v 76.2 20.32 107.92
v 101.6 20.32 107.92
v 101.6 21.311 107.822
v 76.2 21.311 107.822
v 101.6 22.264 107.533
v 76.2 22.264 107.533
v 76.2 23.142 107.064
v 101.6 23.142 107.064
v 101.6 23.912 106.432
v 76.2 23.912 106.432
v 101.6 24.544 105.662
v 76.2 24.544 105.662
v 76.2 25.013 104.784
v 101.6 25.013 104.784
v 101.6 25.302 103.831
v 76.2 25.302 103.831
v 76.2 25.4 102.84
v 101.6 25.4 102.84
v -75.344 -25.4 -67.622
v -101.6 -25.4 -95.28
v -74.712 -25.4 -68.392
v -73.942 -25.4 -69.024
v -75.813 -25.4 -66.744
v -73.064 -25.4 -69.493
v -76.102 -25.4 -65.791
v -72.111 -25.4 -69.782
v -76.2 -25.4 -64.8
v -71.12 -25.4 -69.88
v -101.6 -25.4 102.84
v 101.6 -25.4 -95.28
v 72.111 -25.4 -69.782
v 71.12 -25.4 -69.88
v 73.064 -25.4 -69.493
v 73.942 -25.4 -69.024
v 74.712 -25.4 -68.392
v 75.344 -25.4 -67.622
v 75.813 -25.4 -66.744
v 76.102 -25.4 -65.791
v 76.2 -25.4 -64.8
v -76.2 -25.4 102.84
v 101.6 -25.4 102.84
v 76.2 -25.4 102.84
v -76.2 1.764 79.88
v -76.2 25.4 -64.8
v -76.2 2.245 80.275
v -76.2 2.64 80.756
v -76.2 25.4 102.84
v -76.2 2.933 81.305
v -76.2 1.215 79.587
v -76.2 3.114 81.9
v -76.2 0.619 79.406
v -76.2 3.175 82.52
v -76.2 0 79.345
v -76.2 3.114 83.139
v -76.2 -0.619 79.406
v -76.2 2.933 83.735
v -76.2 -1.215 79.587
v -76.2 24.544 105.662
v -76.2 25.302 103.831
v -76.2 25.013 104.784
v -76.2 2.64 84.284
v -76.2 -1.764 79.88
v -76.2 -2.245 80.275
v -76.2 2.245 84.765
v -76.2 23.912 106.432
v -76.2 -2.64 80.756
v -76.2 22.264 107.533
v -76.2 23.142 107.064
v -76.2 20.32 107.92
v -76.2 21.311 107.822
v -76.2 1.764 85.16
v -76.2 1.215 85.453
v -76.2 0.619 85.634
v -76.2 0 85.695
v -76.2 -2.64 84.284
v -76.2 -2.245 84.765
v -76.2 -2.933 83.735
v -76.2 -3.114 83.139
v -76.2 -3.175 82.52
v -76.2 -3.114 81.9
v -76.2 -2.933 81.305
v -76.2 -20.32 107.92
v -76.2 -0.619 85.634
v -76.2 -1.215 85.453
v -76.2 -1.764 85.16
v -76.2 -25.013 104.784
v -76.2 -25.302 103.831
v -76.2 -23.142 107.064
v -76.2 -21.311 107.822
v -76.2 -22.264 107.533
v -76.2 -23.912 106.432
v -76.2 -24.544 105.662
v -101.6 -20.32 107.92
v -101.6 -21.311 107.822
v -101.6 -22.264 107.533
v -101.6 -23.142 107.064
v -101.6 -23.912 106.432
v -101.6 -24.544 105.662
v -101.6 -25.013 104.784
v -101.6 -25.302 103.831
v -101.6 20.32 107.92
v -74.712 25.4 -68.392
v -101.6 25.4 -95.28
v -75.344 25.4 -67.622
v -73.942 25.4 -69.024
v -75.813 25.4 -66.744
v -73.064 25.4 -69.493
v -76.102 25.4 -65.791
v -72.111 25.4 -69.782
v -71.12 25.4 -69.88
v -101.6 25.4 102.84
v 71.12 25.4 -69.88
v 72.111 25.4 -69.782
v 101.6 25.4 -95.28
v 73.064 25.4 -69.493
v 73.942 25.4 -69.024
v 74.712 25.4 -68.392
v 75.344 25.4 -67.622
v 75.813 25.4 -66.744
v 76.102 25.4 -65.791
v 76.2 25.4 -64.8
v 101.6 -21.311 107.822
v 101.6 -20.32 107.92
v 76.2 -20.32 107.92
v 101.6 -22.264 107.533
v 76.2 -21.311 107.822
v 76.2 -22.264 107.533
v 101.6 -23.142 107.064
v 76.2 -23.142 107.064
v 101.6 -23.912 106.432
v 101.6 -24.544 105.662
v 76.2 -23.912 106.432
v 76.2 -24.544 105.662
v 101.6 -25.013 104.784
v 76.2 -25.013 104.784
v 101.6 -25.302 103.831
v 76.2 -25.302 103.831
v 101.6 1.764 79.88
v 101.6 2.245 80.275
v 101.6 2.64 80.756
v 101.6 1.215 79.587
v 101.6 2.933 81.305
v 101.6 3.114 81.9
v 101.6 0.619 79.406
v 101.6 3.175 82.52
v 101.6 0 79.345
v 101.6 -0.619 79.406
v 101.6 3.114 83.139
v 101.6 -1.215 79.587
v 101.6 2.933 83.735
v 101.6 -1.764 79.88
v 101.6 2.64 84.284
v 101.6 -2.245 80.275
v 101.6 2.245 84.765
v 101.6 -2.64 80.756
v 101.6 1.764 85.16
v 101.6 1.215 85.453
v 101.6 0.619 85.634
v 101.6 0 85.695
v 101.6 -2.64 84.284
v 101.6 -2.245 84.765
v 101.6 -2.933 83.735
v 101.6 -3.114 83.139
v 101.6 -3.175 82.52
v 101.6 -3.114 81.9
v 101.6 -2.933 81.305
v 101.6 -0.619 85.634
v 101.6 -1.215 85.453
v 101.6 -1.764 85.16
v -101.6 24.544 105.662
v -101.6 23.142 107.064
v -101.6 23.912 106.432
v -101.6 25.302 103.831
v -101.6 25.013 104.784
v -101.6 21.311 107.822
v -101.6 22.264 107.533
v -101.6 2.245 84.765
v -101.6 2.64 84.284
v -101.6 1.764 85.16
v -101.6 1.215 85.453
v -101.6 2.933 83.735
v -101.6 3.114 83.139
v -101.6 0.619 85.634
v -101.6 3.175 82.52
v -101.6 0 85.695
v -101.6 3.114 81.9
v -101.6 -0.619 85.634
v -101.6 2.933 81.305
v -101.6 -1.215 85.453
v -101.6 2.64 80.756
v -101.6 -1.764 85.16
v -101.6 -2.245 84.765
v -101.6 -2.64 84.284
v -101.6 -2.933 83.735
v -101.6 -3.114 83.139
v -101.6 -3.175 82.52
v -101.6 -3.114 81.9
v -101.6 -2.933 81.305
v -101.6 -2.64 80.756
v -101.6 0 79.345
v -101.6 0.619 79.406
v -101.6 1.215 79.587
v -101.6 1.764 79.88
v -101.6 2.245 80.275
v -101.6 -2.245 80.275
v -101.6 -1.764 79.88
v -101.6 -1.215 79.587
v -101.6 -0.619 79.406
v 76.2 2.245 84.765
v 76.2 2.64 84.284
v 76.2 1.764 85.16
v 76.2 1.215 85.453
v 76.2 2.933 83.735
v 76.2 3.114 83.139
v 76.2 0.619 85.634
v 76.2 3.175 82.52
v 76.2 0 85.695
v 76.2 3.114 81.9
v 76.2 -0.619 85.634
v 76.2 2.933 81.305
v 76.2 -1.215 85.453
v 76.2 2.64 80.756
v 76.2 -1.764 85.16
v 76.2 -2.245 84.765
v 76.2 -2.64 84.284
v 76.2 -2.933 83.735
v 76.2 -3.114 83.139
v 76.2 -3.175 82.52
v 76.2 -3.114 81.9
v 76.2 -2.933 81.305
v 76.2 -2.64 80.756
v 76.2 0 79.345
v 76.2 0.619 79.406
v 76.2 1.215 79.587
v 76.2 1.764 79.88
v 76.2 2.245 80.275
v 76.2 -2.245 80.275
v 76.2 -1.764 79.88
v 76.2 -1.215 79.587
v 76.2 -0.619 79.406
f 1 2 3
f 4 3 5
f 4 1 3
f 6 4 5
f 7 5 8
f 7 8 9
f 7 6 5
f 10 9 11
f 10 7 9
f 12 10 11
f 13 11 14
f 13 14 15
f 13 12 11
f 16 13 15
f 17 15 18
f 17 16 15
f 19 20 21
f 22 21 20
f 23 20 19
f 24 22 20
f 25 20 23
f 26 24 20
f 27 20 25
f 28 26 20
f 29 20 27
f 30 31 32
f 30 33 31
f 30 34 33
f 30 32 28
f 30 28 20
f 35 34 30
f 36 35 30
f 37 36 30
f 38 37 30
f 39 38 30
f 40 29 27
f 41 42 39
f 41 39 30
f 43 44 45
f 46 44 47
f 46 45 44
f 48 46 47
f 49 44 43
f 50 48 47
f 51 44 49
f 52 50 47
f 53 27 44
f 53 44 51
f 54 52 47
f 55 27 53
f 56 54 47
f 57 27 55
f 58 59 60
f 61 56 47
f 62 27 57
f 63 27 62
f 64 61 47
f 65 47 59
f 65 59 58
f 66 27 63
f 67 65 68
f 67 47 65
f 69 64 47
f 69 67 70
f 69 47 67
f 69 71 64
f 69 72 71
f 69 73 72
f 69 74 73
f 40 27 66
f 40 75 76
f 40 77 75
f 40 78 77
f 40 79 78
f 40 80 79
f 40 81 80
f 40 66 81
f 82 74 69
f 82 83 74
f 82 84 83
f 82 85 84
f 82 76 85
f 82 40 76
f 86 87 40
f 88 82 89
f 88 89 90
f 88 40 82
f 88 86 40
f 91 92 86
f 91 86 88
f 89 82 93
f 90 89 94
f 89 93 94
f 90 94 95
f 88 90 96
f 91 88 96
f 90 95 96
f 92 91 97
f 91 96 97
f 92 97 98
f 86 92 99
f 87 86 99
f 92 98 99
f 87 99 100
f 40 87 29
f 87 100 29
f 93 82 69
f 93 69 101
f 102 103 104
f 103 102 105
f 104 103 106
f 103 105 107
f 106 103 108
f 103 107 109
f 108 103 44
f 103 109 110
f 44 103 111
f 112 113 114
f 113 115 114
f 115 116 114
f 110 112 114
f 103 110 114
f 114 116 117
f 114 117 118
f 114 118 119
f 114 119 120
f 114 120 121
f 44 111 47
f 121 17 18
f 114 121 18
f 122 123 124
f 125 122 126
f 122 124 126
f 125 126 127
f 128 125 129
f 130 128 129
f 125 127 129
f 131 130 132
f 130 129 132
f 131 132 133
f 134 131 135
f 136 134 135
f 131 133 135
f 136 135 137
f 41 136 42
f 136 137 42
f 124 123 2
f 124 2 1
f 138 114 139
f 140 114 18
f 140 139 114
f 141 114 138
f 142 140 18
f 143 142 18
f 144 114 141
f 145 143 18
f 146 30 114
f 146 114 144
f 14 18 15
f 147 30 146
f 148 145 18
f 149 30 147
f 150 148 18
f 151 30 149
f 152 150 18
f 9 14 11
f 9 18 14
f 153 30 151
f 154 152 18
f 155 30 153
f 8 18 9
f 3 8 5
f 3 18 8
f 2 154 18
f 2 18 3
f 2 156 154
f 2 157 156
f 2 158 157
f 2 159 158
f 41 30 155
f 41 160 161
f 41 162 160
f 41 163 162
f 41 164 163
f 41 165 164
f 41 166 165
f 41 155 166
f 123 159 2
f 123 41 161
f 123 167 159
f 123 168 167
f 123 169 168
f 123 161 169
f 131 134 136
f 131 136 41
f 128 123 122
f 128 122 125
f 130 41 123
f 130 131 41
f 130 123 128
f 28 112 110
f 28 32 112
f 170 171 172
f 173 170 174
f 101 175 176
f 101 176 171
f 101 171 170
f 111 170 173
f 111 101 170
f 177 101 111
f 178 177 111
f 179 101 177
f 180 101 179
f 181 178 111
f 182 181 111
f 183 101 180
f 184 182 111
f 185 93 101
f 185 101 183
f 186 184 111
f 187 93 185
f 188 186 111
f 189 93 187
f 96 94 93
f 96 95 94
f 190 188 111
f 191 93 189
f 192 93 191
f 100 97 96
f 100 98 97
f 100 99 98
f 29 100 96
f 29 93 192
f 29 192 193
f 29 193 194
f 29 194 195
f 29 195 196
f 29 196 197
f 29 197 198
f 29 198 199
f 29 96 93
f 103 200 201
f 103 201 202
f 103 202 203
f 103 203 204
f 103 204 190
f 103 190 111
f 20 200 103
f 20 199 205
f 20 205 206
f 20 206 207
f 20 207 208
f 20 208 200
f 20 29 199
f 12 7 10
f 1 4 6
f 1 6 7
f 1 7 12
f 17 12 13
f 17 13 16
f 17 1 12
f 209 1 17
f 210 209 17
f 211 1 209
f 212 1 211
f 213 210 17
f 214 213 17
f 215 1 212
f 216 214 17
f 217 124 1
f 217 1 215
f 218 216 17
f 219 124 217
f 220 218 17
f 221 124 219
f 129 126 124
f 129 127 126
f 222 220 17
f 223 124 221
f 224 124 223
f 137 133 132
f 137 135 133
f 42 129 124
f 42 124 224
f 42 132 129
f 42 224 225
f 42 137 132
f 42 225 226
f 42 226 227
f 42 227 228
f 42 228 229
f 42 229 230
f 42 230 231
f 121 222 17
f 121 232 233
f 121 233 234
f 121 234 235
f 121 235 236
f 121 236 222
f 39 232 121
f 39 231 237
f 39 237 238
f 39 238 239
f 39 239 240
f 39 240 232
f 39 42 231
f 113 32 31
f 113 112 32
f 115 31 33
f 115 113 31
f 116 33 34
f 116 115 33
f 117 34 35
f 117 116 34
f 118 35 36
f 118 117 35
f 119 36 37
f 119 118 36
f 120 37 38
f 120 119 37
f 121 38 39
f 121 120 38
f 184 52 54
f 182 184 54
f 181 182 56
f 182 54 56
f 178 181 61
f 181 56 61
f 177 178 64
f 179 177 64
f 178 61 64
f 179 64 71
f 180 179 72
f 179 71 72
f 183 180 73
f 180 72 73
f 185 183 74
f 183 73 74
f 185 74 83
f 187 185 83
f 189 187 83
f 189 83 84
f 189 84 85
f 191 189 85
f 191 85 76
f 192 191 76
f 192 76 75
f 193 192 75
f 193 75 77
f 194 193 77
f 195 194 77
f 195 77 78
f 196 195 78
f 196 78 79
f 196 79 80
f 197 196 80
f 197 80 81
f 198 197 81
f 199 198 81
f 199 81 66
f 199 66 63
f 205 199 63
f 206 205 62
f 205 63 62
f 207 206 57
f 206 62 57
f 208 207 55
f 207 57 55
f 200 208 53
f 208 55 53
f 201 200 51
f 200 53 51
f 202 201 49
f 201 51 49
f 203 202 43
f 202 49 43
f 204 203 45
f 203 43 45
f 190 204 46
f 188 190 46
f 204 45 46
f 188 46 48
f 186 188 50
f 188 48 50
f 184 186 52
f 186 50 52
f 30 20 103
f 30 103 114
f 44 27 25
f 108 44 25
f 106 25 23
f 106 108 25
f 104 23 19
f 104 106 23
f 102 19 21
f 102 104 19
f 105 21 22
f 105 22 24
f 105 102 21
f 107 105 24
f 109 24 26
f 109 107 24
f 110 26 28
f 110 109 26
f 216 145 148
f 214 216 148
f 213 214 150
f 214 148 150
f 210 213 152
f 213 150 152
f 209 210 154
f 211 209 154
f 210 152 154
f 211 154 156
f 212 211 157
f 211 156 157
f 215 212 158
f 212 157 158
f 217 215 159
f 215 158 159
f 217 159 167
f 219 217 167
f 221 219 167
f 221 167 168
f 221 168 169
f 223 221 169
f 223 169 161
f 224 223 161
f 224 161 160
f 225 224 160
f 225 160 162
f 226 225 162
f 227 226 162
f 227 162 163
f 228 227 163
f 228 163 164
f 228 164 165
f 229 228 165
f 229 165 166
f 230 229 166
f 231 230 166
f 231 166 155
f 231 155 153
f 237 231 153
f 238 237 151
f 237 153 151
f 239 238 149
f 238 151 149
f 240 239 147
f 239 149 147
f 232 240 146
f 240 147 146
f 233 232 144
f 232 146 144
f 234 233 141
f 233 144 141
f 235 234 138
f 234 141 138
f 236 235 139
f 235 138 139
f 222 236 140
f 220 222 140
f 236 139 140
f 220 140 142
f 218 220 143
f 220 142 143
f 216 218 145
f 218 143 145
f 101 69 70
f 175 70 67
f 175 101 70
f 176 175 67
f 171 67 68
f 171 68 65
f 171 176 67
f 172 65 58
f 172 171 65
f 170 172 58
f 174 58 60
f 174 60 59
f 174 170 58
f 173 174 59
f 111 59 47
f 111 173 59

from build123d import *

# Parameters (mm, degrees)
F1_DEPTH      = 25.4
F1_DEPTH_BACK = 25.4
F2_R          = 5.08
F4_D          = 6.35


with BuildPart() as f1:
    # F0 (on Front) → F1 (new body, two sides)
    with BuildSketch(Plane.XZ) as f1_sk:
        Polygon((-76.2, 107.919905), (-101.6, 107.919905), (-101.6, -95.280095), (101.6, -95.280095), (101.6, 107.919905), (76.2, 107.919905), (76.2, -69.880095), (-76.2, -69.880095), align=None)
    extrude(amount=F1_DEPTH)
    extrude(f1_sk.sketch, amount=-F1_DEPTH_BACK)

    # F2
    f2_edges = [f1.edges().sort_by_distance(p)[0] for p in [
        (-88.9, -25.4, 107.919905),
        (-88.9, 25.4, 107.919905),
        (88.9, -25.4, 107.919905),
        (88.9, 25.4, 107.919905),
        (-76.2, 0, -69.880095),
        (76.2, 0, -69.880095),
    ]]
    fillet(f2_edges, radius=F2_R)

    # F4 (through all)
    with Locations(Plane(origin=(-101.6, 0, 0), x_dir=(0, -1, 0), z_dir=(-1, 0, 0))):
        with Locations((0, 82.519905)):
            Hole(F4_D / 2)


solid = f1.part
